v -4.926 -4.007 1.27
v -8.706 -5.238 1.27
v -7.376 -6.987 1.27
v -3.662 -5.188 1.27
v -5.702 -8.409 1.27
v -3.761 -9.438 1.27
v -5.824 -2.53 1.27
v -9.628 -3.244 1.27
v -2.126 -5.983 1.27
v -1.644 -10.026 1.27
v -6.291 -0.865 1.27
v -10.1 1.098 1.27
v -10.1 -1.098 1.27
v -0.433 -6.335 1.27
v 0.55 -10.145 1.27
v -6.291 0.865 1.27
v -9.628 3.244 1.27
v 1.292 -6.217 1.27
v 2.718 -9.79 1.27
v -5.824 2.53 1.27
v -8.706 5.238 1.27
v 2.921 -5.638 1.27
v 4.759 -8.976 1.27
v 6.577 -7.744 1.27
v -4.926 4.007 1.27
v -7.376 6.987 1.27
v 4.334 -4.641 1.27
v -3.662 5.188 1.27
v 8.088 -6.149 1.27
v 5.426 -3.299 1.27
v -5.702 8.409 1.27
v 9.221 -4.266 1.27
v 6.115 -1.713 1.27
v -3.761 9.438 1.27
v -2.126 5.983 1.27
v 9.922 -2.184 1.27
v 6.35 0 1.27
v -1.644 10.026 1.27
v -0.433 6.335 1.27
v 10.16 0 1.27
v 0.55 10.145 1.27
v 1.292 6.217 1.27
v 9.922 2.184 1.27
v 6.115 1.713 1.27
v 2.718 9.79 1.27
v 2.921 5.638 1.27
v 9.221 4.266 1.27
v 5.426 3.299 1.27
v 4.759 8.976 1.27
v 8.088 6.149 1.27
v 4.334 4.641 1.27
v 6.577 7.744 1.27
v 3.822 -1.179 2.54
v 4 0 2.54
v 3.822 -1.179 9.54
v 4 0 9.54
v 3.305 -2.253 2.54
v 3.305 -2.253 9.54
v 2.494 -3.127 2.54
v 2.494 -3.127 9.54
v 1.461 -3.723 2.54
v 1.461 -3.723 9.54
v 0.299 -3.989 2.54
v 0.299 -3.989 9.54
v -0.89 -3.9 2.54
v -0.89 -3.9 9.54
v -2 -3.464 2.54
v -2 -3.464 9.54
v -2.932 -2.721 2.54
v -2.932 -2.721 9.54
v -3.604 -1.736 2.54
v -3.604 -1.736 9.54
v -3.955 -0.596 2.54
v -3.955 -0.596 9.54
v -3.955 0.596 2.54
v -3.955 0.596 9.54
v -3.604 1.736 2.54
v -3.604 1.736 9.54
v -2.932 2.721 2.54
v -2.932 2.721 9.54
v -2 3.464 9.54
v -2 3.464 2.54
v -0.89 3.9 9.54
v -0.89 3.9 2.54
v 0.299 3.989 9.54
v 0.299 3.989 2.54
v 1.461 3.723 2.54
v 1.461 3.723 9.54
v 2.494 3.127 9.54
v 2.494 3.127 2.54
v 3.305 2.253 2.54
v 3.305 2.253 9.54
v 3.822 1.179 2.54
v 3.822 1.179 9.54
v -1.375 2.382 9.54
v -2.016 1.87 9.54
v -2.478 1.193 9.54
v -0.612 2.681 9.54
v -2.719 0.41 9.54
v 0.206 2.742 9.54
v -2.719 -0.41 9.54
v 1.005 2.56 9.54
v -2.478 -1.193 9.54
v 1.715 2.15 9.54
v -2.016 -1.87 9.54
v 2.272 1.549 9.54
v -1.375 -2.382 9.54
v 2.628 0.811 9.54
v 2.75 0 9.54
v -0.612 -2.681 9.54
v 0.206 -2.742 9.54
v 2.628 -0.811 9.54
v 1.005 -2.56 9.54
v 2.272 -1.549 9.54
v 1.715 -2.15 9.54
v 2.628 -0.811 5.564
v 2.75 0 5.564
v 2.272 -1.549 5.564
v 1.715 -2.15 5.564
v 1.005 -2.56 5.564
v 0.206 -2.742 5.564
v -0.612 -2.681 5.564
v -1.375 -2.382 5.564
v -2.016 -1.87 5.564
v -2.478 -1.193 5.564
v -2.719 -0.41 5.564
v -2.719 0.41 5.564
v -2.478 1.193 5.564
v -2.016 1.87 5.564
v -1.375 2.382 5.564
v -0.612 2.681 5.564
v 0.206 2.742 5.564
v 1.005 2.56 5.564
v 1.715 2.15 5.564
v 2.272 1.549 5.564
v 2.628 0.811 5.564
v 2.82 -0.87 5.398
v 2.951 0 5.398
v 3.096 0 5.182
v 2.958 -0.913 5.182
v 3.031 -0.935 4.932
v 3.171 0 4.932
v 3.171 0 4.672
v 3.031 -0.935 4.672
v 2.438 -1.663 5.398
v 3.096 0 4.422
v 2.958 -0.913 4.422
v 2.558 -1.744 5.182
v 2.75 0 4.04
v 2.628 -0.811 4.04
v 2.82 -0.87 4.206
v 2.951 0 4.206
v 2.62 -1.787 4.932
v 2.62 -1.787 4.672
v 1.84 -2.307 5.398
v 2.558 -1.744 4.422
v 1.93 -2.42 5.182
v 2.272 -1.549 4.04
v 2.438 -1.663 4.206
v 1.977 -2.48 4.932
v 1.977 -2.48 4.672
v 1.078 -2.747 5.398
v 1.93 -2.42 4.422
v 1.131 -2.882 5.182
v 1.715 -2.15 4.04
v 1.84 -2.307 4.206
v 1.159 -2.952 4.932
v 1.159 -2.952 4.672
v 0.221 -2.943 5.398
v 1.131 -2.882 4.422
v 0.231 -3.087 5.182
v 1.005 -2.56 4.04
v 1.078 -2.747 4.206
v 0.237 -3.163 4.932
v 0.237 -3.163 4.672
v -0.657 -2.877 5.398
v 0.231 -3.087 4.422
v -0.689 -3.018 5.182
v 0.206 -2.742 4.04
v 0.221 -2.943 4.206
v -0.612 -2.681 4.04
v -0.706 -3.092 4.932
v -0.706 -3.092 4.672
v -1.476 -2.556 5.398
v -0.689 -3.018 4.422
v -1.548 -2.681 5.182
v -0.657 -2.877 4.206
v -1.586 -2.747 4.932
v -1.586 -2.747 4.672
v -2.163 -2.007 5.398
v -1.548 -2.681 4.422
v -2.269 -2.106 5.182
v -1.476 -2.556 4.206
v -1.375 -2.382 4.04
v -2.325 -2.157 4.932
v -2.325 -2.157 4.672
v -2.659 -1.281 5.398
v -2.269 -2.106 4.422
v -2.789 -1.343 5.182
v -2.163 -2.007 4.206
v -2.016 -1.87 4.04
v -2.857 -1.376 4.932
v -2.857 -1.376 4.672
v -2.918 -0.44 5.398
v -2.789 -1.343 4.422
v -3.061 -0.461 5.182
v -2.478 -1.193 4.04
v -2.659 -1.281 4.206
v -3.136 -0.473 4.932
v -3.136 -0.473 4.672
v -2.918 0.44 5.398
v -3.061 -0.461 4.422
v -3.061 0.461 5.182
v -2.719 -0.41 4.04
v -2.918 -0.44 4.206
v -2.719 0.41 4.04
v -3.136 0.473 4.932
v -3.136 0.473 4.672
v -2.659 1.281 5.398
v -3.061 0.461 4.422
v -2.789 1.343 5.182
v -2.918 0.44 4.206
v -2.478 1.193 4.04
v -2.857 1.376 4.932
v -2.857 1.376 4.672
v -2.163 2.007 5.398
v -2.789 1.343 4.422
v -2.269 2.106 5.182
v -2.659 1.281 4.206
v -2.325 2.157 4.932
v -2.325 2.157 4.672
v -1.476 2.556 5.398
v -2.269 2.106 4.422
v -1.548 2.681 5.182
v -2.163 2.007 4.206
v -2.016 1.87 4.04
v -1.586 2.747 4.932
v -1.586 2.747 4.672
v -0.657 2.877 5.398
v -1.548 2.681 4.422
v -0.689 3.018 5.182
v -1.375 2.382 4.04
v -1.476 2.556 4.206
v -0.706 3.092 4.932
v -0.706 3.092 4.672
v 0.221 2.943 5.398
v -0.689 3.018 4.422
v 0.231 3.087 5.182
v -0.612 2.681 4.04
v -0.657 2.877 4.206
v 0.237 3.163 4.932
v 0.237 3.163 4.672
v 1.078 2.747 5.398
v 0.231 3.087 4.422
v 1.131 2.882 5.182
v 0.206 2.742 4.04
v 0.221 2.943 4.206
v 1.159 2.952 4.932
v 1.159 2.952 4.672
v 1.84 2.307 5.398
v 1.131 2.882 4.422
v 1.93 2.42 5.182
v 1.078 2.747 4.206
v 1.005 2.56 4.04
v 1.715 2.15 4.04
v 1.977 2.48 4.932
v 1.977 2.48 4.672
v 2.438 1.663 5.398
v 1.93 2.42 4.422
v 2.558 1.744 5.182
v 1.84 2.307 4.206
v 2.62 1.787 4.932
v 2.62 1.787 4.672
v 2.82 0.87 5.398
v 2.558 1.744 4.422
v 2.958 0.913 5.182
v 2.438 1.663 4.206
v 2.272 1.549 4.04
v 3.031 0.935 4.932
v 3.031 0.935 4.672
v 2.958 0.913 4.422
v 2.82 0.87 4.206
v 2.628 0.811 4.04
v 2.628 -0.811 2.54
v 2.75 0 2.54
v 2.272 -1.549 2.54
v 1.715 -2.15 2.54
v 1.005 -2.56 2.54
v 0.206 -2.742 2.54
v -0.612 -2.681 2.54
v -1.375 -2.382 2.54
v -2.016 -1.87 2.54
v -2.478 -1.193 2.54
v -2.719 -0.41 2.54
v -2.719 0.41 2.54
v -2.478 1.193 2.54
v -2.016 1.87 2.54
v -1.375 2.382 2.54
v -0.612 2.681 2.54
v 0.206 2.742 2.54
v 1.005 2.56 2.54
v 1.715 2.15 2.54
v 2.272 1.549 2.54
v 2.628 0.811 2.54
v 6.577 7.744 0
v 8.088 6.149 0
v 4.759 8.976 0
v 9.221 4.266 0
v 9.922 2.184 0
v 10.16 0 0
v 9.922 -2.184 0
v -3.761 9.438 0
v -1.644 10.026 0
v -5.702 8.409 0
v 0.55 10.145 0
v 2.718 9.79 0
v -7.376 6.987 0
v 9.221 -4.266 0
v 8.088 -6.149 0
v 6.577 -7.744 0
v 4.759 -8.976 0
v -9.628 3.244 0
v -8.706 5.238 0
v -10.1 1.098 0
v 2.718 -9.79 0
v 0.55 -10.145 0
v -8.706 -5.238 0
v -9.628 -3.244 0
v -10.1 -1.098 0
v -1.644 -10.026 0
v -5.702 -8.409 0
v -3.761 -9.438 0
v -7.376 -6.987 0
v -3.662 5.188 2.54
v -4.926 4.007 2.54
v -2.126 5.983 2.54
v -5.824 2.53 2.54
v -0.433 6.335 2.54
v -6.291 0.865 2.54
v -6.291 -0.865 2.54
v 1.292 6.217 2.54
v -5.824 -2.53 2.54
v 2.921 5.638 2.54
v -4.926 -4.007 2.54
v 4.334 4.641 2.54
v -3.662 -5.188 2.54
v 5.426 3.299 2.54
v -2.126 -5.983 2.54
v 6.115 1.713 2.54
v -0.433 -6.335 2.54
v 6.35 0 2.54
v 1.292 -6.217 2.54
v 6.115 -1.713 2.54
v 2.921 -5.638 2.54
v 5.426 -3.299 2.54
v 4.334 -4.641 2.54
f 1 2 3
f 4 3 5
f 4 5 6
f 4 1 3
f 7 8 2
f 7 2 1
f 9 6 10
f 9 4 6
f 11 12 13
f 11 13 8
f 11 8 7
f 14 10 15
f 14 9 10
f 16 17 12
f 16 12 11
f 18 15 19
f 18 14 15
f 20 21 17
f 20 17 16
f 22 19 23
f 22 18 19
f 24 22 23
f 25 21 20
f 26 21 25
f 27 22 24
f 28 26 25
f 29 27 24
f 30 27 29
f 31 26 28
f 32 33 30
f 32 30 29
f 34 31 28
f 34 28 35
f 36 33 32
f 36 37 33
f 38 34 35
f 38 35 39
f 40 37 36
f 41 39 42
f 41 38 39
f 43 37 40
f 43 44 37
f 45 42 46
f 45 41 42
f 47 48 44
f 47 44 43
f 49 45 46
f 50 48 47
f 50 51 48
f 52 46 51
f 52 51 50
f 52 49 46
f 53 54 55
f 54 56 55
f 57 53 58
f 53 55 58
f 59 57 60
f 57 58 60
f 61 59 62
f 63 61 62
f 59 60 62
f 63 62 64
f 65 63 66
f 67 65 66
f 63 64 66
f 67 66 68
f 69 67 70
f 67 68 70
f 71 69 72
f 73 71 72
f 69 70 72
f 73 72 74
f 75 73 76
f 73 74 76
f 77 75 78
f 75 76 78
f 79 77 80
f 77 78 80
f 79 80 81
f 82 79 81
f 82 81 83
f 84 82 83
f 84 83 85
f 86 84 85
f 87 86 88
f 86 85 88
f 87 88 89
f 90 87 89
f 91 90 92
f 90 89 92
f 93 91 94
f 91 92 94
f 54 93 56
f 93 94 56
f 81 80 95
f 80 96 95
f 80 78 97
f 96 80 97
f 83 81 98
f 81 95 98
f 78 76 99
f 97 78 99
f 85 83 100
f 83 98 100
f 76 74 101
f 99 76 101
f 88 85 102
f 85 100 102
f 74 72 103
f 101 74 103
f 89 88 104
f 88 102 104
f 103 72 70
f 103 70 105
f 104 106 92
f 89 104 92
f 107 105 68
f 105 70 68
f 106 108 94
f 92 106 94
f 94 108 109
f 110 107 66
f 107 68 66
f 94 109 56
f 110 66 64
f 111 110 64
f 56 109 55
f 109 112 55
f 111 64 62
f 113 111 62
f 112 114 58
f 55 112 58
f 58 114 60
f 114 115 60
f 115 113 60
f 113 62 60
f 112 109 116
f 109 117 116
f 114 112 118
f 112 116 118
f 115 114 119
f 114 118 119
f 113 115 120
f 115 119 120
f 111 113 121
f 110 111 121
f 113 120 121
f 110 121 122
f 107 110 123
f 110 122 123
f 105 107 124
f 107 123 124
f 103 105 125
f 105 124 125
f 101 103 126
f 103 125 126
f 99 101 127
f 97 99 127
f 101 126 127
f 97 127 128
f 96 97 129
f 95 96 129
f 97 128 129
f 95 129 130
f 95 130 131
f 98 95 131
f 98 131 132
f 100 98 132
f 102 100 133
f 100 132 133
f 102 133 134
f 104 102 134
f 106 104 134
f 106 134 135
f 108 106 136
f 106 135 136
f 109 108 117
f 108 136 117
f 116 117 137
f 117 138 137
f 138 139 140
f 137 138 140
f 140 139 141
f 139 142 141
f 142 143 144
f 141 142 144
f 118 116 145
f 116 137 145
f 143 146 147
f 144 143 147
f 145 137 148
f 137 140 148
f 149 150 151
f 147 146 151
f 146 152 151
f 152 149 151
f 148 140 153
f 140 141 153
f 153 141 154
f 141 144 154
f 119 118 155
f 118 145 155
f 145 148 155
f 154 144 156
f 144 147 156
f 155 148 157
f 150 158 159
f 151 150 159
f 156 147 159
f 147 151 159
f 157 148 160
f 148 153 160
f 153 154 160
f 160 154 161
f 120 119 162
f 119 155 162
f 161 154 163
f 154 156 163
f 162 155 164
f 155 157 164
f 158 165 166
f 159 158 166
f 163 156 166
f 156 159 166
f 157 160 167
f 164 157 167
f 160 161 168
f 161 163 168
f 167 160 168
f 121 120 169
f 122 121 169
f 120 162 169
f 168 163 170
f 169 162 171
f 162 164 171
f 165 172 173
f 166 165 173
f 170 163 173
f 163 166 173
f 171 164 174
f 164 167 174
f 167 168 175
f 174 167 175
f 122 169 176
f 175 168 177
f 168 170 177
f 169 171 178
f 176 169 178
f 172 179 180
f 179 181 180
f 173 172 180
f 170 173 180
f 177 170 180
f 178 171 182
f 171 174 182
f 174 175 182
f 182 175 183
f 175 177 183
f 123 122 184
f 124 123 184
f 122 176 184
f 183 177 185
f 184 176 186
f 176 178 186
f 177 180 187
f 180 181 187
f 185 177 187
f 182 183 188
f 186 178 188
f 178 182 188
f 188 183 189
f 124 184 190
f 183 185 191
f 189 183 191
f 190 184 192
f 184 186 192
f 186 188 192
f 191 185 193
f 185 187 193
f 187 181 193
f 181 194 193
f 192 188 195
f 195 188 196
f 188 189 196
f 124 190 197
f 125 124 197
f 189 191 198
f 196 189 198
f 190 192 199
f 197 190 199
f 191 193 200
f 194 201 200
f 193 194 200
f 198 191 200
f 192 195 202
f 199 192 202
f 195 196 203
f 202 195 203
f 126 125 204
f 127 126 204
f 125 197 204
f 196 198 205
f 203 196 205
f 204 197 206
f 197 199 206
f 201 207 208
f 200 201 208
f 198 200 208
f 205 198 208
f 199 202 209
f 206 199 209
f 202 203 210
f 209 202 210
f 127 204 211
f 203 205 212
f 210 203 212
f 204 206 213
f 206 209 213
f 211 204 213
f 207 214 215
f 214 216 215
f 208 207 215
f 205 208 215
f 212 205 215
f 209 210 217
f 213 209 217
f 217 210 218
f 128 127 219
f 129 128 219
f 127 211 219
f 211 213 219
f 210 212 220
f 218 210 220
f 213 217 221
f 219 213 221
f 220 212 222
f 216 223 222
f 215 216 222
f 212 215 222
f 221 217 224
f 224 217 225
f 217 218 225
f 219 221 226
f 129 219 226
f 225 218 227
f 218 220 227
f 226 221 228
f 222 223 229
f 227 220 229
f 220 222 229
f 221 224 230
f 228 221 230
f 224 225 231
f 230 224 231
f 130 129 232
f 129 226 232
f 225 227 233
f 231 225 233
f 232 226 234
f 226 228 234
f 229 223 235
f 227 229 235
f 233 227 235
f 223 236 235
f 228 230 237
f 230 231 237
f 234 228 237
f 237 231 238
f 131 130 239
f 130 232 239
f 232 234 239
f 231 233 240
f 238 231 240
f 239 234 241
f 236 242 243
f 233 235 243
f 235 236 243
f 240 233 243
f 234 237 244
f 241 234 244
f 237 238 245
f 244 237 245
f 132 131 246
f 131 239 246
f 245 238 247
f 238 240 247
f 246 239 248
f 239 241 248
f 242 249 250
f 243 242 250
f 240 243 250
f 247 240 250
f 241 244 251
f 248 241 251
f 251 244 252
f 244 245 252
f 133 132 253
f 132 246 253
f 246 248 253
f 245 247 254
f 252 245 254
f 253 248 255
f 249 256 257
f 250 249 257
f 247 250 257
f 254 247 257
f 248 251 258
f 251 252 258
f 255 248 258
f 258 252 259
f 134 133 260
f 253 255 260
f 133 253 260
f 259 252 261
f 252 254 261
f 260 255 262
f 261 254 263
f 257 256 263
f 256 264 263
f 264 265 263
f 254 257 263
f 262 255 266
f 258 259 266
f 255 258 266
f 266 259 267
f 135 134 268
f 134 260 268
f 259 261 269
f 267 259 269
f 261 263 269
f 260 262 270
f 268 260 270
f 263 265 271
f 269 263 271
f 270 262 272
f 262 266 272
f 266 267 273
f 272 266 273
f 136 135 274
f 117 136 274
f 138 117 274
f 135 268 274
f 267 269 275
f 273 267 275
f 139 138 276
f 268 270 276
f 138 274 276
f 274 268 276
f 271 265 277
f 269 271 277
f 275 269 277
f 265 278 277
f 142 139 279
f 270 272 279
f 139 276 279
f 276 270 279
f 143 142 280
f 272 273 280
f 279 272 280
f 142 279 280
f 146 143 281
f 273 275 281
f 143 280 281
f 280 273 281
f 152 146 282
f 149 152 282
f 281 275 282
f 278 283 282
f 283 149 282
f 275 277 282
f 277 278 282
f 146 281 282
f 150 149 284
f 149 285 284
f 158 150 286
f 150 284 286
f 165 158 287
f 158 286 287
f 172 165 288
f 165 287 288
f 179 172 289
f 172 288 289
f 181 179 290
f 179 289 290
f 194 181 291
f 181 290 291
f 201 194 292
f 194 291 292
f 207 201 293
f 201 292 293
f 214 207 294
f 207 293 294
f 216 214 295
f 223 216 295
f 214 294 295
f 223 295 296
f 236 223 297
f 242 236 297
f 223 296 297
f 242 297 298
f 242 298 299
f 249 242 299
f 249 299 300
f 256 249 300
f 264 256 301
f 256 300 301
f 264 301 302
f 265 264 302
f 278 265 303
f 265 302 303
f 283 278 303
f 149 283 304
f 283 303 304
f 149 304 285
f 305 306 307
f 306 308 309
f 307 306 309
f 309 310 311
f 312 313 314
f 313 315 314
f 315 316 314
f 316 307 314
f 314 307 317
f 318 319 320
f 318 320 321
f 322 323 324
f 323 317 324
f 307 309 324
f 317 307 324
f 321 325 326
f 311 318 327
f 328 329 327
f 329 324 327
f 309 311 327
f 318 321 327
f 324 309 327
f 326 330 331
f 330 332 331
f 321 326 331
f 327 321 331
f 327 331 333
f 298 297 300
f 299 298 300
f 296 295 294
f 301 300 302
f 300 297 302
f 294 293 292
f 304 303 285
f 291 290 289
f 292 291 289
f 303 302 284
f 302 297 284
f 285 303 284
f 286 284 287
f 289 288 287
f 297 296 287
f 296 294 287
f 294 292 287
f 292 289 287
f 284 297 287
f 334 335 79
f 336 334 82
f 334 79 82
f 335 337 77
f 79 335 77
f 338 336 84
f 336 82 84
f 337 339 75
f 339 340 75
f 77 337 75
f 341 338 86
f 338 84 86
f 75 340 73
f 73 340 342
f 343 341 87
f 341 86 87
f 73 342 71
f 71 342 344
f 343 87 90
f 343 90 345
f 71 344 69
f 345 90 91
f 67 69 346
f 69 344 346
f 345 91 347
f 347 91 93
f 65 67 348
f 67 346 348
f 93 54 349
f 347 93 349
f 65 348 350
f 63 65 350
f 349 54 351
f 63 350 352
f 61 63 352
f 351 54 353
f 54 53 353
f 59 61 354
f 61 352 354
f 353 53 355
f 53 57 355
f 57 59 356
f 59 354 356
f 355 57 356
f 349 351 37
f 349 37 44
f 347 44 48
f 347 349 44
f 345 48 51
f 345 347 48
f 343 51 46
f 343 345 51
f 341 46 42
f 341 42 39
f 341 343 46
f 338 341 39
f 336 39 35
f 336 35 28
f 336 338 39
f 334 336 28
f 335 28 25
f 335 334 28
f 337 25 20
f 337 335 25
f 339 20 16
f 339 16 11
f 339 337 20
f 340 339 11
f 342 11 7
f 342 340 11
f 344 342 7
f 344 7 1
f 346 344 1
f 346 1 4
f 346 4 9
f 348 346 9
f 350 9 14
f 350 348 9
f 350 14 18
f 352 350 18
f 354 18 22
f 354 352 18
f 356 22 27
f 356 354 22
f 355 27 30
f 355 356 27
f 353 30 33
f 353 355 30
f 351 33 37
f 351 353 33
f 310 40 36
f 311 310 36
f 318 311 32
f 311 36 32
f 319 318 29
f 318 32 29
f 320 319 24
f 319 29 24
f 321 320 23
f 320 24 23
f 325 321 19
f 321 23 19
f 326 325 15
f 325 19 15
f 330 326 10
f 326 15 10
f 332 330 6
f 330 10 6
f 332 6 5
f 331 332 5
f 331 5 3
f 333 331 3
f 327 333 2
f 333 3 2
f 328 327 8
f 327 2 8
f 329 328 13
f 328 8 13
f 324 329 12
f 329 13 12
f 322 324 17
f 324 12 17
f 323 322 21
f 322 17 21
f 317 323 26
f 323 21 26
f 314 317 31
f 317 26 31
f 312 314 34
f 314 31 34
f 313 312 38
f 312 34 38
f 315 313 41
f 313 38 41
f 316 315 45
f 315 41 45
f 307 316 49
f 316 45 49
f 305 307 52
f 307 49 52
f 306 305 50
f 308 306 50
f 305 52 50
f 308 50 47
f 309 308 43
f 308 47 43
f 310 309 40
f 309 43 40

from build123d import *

# Parameters (mm, degrees)
F2_R     = 10.16
F2_R_2   = 6.35
F3_DEPTH = 1.27


with BuildPart() as f1:
    # F0 (on Front) → F1 (revolve)
    with BuildSketch(Plane.XZ):
        with BuildLine():
            Line((0, 2.54), (0, 0))
            Line((0, 0), (10.16, 0))
            Line((10.16, 0), (10.16, 2.54))
            Line((10.16, 2.54), (4, 2.54))
            Line((4, 2.54), (4, 9.54))
            Line((4, 9.54), (2.75, 9.54))
            Line((2.75, 9.54), (2.75, 5.564))
            ThreePointArc((2.75, 5.564), (3.181095, 4.802), (2.75, 4.04))
            Line((2.75, 4.04), (2.75, 2.54))
            Line((2.75, 2.54), (0, 2.54))
        make_face()
    revolve(axis=Axis((0, 0, 1.27), (0, 0, -1)))

    # F2 (on face) → F3 (cut)
    with BuildSketch(Plane.XY.offset(2.54)):
        Circle(F2_R)
        Circle(F2_R_2, mode=Mode.SUBTRACT)
    extrude(amount=-F3_DEPTH, mode=Mode.SUBTRACT)


solid = f1.part
